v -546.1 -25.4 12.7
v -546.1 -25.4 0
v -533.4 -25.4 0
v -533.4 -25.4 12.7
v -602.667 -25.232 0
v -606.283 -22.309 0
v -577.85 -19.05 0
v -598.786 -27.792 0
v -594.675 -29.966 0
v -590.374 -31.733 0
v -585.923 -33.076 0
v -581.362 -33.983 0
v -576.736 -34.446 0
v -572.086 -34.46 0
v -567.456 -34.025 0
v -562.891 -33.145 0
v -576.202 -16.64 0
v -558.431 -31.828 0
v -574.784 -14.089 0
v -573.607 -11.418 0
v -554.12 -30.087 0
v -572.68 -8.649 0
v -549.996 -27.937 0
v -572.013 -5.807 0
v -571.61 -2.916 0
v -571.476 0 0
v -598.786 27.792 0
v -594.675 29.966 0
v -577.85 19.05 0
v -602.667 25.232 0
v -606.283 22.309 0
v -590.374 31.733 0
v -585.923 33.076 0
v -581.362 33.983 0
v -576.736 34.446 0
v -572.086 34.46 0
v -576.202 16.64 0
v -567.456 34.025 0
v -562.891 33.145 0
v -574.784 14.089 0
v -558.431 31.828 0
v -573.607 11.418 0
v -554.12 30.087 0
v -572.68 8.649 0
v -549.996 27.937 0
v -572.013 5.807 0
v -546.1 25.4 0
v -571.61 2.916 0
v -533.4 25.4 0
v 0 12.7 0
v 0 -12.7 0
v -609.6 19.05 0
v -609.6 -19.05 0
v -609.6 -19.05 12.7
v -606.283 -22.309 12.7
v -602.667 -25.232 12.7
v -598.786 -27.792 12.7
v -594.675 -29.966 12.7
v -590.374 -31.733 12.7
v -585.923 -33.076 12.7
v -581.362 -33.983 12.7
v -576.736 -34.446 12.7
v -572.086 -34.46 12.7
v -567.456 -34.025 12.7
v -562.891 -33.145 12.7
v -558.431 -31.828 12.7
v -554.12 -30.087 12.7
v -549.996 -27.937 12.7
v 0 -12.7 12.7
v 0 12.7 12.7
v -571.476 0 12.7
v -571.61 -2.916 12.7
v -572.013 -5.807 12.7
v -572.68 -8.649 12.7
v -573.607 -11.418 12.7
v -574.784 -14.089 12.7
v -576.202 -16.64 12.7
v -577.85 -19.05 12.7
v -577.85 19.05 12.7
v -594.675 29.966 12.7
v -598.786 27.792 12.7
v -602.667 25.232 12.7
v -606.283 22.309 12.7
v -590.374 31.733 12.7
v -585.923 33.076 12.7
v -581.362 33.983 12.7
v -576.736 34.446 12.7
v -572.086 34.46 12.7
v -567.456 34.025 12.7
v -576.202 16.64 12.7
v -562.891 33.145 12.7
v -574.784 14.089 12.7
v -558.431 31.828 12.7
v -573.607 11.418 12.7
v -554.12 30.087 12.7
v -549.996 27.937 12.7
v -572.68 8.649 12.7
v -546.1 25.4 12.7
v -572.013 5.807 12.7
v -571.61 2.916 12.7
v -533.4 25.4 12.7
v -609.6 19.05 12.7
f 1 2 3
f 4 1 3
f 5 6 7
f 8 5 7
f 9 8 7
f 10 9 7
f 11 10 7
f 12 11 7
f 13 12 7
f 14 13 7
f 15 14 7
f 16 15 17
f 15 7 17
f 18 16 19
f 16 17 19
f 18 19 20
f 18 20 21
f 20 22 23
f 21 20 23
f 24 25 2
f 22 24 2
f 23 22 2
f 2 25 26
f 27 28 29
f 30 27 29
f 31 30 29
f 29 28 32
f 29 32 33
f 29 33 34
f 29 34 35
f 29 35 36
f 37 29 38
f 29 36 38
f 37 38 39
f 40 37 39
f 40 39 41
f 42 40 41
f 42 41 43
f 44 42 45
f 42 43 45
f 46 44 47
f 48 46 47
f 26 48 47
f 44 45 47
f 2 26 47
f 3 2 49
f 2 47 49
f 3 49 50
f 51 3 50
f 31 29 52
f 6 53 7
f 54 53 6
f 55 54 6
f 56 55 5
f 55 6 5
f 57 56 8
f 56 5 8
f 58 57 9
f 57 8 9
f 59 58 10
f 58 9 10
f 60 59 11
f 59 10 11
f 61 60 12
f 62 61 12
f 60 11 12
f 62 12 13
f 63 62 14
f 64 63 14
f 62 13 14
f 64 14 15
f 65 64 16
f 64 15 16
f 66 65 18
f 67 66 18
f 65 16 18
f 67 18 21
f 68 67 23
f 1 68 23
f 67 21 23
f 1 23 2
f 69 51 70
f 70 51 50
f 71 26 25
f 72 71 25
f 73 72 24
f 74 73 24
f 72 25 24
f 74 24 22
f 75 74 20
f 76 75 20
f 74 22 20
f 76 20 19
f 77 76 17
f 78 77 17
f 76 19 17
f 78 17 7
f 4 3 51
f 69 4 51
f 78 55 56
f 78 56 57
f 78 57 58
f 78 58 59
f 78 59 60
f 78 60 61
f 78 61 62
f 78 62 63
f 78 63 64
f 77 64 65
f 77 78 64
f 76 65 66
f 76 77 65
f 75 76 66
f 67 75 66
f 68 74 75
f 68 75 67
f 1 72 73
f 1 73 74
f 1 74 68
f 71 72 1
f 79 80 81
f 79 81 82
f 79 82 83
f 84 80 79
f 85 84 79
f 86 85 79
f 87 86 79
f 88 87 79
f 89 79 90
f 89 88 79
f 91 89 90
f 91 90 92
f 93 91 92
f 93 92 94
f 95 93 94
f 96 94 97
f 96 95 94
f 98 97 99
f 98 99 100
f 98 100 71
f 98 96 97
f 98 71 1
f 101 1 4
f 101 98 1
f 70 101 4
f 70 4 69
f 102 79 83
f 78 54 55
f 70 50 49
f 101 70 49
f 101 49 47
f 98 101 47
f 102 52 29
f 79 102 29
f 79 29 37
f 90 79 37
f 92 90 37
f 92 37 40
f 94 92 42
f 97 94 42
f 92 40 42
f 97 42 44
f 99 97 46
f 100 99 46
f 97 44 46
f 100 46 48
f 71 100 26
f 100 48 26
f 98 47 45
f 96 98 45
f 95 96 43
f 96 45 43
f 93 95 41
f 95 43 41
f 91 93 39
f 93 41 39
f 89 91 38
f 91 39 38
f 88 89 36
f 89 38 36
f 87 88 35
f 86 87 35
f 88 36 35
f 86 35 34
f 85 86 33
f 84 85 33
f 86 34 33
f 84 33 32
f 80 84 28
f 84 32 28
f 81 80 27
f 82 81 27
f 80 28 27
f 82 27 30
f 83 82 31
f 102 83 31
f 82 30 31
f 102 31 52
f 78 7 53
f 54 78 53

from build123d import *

# Parameters (mm, degrees)
F1_DEPTH = 12.7


with BuildPart() as f1:
    # F0 (on Top) → F1 (new body)
    with BuildSketch(Plane.XY):
        with BuildLine():
            Line((-571.475674, 0), (0, 0))
            Line((0, 0), (0, 12.7))
            Line((0, 12.7), (-533.4, 25.4))
            Line((-533.4, 25.4), (-546.1, 25.4))
            ThreePointArc((-546.1, 25.4), (-579.054577, 34.270767), (-609.6, 19.05))
            Line((-609.6, 19.05), (-577.85, 19.05))
            ThreePointArc((-577.85, 19.05), (-573.111527, 10.044084), (-571.475674, 0))
        make_face()
        with BuildLine():
            Line((0, -12.7), (0, 0))
            Line((0, 0), (-571.475674, 0))
            ThreePointArc((-571.475674, 0), (-573.111527, -10.044084), (-577.85, -19.05))
            Line((-577.85, -19.05), (-609.6, -19.05))
            ThreePointArc((-609.6, -19.05), (-579.054577, -34.270767), (-546.1, -25.4))
            Line((-546.1, -25.4), (-533.4, -25.4))
            Line((-533.4, -25.4), (0, -12.7))
        make_face()
    extrude(amount=F1_DEPTH)


solid = f1.part
